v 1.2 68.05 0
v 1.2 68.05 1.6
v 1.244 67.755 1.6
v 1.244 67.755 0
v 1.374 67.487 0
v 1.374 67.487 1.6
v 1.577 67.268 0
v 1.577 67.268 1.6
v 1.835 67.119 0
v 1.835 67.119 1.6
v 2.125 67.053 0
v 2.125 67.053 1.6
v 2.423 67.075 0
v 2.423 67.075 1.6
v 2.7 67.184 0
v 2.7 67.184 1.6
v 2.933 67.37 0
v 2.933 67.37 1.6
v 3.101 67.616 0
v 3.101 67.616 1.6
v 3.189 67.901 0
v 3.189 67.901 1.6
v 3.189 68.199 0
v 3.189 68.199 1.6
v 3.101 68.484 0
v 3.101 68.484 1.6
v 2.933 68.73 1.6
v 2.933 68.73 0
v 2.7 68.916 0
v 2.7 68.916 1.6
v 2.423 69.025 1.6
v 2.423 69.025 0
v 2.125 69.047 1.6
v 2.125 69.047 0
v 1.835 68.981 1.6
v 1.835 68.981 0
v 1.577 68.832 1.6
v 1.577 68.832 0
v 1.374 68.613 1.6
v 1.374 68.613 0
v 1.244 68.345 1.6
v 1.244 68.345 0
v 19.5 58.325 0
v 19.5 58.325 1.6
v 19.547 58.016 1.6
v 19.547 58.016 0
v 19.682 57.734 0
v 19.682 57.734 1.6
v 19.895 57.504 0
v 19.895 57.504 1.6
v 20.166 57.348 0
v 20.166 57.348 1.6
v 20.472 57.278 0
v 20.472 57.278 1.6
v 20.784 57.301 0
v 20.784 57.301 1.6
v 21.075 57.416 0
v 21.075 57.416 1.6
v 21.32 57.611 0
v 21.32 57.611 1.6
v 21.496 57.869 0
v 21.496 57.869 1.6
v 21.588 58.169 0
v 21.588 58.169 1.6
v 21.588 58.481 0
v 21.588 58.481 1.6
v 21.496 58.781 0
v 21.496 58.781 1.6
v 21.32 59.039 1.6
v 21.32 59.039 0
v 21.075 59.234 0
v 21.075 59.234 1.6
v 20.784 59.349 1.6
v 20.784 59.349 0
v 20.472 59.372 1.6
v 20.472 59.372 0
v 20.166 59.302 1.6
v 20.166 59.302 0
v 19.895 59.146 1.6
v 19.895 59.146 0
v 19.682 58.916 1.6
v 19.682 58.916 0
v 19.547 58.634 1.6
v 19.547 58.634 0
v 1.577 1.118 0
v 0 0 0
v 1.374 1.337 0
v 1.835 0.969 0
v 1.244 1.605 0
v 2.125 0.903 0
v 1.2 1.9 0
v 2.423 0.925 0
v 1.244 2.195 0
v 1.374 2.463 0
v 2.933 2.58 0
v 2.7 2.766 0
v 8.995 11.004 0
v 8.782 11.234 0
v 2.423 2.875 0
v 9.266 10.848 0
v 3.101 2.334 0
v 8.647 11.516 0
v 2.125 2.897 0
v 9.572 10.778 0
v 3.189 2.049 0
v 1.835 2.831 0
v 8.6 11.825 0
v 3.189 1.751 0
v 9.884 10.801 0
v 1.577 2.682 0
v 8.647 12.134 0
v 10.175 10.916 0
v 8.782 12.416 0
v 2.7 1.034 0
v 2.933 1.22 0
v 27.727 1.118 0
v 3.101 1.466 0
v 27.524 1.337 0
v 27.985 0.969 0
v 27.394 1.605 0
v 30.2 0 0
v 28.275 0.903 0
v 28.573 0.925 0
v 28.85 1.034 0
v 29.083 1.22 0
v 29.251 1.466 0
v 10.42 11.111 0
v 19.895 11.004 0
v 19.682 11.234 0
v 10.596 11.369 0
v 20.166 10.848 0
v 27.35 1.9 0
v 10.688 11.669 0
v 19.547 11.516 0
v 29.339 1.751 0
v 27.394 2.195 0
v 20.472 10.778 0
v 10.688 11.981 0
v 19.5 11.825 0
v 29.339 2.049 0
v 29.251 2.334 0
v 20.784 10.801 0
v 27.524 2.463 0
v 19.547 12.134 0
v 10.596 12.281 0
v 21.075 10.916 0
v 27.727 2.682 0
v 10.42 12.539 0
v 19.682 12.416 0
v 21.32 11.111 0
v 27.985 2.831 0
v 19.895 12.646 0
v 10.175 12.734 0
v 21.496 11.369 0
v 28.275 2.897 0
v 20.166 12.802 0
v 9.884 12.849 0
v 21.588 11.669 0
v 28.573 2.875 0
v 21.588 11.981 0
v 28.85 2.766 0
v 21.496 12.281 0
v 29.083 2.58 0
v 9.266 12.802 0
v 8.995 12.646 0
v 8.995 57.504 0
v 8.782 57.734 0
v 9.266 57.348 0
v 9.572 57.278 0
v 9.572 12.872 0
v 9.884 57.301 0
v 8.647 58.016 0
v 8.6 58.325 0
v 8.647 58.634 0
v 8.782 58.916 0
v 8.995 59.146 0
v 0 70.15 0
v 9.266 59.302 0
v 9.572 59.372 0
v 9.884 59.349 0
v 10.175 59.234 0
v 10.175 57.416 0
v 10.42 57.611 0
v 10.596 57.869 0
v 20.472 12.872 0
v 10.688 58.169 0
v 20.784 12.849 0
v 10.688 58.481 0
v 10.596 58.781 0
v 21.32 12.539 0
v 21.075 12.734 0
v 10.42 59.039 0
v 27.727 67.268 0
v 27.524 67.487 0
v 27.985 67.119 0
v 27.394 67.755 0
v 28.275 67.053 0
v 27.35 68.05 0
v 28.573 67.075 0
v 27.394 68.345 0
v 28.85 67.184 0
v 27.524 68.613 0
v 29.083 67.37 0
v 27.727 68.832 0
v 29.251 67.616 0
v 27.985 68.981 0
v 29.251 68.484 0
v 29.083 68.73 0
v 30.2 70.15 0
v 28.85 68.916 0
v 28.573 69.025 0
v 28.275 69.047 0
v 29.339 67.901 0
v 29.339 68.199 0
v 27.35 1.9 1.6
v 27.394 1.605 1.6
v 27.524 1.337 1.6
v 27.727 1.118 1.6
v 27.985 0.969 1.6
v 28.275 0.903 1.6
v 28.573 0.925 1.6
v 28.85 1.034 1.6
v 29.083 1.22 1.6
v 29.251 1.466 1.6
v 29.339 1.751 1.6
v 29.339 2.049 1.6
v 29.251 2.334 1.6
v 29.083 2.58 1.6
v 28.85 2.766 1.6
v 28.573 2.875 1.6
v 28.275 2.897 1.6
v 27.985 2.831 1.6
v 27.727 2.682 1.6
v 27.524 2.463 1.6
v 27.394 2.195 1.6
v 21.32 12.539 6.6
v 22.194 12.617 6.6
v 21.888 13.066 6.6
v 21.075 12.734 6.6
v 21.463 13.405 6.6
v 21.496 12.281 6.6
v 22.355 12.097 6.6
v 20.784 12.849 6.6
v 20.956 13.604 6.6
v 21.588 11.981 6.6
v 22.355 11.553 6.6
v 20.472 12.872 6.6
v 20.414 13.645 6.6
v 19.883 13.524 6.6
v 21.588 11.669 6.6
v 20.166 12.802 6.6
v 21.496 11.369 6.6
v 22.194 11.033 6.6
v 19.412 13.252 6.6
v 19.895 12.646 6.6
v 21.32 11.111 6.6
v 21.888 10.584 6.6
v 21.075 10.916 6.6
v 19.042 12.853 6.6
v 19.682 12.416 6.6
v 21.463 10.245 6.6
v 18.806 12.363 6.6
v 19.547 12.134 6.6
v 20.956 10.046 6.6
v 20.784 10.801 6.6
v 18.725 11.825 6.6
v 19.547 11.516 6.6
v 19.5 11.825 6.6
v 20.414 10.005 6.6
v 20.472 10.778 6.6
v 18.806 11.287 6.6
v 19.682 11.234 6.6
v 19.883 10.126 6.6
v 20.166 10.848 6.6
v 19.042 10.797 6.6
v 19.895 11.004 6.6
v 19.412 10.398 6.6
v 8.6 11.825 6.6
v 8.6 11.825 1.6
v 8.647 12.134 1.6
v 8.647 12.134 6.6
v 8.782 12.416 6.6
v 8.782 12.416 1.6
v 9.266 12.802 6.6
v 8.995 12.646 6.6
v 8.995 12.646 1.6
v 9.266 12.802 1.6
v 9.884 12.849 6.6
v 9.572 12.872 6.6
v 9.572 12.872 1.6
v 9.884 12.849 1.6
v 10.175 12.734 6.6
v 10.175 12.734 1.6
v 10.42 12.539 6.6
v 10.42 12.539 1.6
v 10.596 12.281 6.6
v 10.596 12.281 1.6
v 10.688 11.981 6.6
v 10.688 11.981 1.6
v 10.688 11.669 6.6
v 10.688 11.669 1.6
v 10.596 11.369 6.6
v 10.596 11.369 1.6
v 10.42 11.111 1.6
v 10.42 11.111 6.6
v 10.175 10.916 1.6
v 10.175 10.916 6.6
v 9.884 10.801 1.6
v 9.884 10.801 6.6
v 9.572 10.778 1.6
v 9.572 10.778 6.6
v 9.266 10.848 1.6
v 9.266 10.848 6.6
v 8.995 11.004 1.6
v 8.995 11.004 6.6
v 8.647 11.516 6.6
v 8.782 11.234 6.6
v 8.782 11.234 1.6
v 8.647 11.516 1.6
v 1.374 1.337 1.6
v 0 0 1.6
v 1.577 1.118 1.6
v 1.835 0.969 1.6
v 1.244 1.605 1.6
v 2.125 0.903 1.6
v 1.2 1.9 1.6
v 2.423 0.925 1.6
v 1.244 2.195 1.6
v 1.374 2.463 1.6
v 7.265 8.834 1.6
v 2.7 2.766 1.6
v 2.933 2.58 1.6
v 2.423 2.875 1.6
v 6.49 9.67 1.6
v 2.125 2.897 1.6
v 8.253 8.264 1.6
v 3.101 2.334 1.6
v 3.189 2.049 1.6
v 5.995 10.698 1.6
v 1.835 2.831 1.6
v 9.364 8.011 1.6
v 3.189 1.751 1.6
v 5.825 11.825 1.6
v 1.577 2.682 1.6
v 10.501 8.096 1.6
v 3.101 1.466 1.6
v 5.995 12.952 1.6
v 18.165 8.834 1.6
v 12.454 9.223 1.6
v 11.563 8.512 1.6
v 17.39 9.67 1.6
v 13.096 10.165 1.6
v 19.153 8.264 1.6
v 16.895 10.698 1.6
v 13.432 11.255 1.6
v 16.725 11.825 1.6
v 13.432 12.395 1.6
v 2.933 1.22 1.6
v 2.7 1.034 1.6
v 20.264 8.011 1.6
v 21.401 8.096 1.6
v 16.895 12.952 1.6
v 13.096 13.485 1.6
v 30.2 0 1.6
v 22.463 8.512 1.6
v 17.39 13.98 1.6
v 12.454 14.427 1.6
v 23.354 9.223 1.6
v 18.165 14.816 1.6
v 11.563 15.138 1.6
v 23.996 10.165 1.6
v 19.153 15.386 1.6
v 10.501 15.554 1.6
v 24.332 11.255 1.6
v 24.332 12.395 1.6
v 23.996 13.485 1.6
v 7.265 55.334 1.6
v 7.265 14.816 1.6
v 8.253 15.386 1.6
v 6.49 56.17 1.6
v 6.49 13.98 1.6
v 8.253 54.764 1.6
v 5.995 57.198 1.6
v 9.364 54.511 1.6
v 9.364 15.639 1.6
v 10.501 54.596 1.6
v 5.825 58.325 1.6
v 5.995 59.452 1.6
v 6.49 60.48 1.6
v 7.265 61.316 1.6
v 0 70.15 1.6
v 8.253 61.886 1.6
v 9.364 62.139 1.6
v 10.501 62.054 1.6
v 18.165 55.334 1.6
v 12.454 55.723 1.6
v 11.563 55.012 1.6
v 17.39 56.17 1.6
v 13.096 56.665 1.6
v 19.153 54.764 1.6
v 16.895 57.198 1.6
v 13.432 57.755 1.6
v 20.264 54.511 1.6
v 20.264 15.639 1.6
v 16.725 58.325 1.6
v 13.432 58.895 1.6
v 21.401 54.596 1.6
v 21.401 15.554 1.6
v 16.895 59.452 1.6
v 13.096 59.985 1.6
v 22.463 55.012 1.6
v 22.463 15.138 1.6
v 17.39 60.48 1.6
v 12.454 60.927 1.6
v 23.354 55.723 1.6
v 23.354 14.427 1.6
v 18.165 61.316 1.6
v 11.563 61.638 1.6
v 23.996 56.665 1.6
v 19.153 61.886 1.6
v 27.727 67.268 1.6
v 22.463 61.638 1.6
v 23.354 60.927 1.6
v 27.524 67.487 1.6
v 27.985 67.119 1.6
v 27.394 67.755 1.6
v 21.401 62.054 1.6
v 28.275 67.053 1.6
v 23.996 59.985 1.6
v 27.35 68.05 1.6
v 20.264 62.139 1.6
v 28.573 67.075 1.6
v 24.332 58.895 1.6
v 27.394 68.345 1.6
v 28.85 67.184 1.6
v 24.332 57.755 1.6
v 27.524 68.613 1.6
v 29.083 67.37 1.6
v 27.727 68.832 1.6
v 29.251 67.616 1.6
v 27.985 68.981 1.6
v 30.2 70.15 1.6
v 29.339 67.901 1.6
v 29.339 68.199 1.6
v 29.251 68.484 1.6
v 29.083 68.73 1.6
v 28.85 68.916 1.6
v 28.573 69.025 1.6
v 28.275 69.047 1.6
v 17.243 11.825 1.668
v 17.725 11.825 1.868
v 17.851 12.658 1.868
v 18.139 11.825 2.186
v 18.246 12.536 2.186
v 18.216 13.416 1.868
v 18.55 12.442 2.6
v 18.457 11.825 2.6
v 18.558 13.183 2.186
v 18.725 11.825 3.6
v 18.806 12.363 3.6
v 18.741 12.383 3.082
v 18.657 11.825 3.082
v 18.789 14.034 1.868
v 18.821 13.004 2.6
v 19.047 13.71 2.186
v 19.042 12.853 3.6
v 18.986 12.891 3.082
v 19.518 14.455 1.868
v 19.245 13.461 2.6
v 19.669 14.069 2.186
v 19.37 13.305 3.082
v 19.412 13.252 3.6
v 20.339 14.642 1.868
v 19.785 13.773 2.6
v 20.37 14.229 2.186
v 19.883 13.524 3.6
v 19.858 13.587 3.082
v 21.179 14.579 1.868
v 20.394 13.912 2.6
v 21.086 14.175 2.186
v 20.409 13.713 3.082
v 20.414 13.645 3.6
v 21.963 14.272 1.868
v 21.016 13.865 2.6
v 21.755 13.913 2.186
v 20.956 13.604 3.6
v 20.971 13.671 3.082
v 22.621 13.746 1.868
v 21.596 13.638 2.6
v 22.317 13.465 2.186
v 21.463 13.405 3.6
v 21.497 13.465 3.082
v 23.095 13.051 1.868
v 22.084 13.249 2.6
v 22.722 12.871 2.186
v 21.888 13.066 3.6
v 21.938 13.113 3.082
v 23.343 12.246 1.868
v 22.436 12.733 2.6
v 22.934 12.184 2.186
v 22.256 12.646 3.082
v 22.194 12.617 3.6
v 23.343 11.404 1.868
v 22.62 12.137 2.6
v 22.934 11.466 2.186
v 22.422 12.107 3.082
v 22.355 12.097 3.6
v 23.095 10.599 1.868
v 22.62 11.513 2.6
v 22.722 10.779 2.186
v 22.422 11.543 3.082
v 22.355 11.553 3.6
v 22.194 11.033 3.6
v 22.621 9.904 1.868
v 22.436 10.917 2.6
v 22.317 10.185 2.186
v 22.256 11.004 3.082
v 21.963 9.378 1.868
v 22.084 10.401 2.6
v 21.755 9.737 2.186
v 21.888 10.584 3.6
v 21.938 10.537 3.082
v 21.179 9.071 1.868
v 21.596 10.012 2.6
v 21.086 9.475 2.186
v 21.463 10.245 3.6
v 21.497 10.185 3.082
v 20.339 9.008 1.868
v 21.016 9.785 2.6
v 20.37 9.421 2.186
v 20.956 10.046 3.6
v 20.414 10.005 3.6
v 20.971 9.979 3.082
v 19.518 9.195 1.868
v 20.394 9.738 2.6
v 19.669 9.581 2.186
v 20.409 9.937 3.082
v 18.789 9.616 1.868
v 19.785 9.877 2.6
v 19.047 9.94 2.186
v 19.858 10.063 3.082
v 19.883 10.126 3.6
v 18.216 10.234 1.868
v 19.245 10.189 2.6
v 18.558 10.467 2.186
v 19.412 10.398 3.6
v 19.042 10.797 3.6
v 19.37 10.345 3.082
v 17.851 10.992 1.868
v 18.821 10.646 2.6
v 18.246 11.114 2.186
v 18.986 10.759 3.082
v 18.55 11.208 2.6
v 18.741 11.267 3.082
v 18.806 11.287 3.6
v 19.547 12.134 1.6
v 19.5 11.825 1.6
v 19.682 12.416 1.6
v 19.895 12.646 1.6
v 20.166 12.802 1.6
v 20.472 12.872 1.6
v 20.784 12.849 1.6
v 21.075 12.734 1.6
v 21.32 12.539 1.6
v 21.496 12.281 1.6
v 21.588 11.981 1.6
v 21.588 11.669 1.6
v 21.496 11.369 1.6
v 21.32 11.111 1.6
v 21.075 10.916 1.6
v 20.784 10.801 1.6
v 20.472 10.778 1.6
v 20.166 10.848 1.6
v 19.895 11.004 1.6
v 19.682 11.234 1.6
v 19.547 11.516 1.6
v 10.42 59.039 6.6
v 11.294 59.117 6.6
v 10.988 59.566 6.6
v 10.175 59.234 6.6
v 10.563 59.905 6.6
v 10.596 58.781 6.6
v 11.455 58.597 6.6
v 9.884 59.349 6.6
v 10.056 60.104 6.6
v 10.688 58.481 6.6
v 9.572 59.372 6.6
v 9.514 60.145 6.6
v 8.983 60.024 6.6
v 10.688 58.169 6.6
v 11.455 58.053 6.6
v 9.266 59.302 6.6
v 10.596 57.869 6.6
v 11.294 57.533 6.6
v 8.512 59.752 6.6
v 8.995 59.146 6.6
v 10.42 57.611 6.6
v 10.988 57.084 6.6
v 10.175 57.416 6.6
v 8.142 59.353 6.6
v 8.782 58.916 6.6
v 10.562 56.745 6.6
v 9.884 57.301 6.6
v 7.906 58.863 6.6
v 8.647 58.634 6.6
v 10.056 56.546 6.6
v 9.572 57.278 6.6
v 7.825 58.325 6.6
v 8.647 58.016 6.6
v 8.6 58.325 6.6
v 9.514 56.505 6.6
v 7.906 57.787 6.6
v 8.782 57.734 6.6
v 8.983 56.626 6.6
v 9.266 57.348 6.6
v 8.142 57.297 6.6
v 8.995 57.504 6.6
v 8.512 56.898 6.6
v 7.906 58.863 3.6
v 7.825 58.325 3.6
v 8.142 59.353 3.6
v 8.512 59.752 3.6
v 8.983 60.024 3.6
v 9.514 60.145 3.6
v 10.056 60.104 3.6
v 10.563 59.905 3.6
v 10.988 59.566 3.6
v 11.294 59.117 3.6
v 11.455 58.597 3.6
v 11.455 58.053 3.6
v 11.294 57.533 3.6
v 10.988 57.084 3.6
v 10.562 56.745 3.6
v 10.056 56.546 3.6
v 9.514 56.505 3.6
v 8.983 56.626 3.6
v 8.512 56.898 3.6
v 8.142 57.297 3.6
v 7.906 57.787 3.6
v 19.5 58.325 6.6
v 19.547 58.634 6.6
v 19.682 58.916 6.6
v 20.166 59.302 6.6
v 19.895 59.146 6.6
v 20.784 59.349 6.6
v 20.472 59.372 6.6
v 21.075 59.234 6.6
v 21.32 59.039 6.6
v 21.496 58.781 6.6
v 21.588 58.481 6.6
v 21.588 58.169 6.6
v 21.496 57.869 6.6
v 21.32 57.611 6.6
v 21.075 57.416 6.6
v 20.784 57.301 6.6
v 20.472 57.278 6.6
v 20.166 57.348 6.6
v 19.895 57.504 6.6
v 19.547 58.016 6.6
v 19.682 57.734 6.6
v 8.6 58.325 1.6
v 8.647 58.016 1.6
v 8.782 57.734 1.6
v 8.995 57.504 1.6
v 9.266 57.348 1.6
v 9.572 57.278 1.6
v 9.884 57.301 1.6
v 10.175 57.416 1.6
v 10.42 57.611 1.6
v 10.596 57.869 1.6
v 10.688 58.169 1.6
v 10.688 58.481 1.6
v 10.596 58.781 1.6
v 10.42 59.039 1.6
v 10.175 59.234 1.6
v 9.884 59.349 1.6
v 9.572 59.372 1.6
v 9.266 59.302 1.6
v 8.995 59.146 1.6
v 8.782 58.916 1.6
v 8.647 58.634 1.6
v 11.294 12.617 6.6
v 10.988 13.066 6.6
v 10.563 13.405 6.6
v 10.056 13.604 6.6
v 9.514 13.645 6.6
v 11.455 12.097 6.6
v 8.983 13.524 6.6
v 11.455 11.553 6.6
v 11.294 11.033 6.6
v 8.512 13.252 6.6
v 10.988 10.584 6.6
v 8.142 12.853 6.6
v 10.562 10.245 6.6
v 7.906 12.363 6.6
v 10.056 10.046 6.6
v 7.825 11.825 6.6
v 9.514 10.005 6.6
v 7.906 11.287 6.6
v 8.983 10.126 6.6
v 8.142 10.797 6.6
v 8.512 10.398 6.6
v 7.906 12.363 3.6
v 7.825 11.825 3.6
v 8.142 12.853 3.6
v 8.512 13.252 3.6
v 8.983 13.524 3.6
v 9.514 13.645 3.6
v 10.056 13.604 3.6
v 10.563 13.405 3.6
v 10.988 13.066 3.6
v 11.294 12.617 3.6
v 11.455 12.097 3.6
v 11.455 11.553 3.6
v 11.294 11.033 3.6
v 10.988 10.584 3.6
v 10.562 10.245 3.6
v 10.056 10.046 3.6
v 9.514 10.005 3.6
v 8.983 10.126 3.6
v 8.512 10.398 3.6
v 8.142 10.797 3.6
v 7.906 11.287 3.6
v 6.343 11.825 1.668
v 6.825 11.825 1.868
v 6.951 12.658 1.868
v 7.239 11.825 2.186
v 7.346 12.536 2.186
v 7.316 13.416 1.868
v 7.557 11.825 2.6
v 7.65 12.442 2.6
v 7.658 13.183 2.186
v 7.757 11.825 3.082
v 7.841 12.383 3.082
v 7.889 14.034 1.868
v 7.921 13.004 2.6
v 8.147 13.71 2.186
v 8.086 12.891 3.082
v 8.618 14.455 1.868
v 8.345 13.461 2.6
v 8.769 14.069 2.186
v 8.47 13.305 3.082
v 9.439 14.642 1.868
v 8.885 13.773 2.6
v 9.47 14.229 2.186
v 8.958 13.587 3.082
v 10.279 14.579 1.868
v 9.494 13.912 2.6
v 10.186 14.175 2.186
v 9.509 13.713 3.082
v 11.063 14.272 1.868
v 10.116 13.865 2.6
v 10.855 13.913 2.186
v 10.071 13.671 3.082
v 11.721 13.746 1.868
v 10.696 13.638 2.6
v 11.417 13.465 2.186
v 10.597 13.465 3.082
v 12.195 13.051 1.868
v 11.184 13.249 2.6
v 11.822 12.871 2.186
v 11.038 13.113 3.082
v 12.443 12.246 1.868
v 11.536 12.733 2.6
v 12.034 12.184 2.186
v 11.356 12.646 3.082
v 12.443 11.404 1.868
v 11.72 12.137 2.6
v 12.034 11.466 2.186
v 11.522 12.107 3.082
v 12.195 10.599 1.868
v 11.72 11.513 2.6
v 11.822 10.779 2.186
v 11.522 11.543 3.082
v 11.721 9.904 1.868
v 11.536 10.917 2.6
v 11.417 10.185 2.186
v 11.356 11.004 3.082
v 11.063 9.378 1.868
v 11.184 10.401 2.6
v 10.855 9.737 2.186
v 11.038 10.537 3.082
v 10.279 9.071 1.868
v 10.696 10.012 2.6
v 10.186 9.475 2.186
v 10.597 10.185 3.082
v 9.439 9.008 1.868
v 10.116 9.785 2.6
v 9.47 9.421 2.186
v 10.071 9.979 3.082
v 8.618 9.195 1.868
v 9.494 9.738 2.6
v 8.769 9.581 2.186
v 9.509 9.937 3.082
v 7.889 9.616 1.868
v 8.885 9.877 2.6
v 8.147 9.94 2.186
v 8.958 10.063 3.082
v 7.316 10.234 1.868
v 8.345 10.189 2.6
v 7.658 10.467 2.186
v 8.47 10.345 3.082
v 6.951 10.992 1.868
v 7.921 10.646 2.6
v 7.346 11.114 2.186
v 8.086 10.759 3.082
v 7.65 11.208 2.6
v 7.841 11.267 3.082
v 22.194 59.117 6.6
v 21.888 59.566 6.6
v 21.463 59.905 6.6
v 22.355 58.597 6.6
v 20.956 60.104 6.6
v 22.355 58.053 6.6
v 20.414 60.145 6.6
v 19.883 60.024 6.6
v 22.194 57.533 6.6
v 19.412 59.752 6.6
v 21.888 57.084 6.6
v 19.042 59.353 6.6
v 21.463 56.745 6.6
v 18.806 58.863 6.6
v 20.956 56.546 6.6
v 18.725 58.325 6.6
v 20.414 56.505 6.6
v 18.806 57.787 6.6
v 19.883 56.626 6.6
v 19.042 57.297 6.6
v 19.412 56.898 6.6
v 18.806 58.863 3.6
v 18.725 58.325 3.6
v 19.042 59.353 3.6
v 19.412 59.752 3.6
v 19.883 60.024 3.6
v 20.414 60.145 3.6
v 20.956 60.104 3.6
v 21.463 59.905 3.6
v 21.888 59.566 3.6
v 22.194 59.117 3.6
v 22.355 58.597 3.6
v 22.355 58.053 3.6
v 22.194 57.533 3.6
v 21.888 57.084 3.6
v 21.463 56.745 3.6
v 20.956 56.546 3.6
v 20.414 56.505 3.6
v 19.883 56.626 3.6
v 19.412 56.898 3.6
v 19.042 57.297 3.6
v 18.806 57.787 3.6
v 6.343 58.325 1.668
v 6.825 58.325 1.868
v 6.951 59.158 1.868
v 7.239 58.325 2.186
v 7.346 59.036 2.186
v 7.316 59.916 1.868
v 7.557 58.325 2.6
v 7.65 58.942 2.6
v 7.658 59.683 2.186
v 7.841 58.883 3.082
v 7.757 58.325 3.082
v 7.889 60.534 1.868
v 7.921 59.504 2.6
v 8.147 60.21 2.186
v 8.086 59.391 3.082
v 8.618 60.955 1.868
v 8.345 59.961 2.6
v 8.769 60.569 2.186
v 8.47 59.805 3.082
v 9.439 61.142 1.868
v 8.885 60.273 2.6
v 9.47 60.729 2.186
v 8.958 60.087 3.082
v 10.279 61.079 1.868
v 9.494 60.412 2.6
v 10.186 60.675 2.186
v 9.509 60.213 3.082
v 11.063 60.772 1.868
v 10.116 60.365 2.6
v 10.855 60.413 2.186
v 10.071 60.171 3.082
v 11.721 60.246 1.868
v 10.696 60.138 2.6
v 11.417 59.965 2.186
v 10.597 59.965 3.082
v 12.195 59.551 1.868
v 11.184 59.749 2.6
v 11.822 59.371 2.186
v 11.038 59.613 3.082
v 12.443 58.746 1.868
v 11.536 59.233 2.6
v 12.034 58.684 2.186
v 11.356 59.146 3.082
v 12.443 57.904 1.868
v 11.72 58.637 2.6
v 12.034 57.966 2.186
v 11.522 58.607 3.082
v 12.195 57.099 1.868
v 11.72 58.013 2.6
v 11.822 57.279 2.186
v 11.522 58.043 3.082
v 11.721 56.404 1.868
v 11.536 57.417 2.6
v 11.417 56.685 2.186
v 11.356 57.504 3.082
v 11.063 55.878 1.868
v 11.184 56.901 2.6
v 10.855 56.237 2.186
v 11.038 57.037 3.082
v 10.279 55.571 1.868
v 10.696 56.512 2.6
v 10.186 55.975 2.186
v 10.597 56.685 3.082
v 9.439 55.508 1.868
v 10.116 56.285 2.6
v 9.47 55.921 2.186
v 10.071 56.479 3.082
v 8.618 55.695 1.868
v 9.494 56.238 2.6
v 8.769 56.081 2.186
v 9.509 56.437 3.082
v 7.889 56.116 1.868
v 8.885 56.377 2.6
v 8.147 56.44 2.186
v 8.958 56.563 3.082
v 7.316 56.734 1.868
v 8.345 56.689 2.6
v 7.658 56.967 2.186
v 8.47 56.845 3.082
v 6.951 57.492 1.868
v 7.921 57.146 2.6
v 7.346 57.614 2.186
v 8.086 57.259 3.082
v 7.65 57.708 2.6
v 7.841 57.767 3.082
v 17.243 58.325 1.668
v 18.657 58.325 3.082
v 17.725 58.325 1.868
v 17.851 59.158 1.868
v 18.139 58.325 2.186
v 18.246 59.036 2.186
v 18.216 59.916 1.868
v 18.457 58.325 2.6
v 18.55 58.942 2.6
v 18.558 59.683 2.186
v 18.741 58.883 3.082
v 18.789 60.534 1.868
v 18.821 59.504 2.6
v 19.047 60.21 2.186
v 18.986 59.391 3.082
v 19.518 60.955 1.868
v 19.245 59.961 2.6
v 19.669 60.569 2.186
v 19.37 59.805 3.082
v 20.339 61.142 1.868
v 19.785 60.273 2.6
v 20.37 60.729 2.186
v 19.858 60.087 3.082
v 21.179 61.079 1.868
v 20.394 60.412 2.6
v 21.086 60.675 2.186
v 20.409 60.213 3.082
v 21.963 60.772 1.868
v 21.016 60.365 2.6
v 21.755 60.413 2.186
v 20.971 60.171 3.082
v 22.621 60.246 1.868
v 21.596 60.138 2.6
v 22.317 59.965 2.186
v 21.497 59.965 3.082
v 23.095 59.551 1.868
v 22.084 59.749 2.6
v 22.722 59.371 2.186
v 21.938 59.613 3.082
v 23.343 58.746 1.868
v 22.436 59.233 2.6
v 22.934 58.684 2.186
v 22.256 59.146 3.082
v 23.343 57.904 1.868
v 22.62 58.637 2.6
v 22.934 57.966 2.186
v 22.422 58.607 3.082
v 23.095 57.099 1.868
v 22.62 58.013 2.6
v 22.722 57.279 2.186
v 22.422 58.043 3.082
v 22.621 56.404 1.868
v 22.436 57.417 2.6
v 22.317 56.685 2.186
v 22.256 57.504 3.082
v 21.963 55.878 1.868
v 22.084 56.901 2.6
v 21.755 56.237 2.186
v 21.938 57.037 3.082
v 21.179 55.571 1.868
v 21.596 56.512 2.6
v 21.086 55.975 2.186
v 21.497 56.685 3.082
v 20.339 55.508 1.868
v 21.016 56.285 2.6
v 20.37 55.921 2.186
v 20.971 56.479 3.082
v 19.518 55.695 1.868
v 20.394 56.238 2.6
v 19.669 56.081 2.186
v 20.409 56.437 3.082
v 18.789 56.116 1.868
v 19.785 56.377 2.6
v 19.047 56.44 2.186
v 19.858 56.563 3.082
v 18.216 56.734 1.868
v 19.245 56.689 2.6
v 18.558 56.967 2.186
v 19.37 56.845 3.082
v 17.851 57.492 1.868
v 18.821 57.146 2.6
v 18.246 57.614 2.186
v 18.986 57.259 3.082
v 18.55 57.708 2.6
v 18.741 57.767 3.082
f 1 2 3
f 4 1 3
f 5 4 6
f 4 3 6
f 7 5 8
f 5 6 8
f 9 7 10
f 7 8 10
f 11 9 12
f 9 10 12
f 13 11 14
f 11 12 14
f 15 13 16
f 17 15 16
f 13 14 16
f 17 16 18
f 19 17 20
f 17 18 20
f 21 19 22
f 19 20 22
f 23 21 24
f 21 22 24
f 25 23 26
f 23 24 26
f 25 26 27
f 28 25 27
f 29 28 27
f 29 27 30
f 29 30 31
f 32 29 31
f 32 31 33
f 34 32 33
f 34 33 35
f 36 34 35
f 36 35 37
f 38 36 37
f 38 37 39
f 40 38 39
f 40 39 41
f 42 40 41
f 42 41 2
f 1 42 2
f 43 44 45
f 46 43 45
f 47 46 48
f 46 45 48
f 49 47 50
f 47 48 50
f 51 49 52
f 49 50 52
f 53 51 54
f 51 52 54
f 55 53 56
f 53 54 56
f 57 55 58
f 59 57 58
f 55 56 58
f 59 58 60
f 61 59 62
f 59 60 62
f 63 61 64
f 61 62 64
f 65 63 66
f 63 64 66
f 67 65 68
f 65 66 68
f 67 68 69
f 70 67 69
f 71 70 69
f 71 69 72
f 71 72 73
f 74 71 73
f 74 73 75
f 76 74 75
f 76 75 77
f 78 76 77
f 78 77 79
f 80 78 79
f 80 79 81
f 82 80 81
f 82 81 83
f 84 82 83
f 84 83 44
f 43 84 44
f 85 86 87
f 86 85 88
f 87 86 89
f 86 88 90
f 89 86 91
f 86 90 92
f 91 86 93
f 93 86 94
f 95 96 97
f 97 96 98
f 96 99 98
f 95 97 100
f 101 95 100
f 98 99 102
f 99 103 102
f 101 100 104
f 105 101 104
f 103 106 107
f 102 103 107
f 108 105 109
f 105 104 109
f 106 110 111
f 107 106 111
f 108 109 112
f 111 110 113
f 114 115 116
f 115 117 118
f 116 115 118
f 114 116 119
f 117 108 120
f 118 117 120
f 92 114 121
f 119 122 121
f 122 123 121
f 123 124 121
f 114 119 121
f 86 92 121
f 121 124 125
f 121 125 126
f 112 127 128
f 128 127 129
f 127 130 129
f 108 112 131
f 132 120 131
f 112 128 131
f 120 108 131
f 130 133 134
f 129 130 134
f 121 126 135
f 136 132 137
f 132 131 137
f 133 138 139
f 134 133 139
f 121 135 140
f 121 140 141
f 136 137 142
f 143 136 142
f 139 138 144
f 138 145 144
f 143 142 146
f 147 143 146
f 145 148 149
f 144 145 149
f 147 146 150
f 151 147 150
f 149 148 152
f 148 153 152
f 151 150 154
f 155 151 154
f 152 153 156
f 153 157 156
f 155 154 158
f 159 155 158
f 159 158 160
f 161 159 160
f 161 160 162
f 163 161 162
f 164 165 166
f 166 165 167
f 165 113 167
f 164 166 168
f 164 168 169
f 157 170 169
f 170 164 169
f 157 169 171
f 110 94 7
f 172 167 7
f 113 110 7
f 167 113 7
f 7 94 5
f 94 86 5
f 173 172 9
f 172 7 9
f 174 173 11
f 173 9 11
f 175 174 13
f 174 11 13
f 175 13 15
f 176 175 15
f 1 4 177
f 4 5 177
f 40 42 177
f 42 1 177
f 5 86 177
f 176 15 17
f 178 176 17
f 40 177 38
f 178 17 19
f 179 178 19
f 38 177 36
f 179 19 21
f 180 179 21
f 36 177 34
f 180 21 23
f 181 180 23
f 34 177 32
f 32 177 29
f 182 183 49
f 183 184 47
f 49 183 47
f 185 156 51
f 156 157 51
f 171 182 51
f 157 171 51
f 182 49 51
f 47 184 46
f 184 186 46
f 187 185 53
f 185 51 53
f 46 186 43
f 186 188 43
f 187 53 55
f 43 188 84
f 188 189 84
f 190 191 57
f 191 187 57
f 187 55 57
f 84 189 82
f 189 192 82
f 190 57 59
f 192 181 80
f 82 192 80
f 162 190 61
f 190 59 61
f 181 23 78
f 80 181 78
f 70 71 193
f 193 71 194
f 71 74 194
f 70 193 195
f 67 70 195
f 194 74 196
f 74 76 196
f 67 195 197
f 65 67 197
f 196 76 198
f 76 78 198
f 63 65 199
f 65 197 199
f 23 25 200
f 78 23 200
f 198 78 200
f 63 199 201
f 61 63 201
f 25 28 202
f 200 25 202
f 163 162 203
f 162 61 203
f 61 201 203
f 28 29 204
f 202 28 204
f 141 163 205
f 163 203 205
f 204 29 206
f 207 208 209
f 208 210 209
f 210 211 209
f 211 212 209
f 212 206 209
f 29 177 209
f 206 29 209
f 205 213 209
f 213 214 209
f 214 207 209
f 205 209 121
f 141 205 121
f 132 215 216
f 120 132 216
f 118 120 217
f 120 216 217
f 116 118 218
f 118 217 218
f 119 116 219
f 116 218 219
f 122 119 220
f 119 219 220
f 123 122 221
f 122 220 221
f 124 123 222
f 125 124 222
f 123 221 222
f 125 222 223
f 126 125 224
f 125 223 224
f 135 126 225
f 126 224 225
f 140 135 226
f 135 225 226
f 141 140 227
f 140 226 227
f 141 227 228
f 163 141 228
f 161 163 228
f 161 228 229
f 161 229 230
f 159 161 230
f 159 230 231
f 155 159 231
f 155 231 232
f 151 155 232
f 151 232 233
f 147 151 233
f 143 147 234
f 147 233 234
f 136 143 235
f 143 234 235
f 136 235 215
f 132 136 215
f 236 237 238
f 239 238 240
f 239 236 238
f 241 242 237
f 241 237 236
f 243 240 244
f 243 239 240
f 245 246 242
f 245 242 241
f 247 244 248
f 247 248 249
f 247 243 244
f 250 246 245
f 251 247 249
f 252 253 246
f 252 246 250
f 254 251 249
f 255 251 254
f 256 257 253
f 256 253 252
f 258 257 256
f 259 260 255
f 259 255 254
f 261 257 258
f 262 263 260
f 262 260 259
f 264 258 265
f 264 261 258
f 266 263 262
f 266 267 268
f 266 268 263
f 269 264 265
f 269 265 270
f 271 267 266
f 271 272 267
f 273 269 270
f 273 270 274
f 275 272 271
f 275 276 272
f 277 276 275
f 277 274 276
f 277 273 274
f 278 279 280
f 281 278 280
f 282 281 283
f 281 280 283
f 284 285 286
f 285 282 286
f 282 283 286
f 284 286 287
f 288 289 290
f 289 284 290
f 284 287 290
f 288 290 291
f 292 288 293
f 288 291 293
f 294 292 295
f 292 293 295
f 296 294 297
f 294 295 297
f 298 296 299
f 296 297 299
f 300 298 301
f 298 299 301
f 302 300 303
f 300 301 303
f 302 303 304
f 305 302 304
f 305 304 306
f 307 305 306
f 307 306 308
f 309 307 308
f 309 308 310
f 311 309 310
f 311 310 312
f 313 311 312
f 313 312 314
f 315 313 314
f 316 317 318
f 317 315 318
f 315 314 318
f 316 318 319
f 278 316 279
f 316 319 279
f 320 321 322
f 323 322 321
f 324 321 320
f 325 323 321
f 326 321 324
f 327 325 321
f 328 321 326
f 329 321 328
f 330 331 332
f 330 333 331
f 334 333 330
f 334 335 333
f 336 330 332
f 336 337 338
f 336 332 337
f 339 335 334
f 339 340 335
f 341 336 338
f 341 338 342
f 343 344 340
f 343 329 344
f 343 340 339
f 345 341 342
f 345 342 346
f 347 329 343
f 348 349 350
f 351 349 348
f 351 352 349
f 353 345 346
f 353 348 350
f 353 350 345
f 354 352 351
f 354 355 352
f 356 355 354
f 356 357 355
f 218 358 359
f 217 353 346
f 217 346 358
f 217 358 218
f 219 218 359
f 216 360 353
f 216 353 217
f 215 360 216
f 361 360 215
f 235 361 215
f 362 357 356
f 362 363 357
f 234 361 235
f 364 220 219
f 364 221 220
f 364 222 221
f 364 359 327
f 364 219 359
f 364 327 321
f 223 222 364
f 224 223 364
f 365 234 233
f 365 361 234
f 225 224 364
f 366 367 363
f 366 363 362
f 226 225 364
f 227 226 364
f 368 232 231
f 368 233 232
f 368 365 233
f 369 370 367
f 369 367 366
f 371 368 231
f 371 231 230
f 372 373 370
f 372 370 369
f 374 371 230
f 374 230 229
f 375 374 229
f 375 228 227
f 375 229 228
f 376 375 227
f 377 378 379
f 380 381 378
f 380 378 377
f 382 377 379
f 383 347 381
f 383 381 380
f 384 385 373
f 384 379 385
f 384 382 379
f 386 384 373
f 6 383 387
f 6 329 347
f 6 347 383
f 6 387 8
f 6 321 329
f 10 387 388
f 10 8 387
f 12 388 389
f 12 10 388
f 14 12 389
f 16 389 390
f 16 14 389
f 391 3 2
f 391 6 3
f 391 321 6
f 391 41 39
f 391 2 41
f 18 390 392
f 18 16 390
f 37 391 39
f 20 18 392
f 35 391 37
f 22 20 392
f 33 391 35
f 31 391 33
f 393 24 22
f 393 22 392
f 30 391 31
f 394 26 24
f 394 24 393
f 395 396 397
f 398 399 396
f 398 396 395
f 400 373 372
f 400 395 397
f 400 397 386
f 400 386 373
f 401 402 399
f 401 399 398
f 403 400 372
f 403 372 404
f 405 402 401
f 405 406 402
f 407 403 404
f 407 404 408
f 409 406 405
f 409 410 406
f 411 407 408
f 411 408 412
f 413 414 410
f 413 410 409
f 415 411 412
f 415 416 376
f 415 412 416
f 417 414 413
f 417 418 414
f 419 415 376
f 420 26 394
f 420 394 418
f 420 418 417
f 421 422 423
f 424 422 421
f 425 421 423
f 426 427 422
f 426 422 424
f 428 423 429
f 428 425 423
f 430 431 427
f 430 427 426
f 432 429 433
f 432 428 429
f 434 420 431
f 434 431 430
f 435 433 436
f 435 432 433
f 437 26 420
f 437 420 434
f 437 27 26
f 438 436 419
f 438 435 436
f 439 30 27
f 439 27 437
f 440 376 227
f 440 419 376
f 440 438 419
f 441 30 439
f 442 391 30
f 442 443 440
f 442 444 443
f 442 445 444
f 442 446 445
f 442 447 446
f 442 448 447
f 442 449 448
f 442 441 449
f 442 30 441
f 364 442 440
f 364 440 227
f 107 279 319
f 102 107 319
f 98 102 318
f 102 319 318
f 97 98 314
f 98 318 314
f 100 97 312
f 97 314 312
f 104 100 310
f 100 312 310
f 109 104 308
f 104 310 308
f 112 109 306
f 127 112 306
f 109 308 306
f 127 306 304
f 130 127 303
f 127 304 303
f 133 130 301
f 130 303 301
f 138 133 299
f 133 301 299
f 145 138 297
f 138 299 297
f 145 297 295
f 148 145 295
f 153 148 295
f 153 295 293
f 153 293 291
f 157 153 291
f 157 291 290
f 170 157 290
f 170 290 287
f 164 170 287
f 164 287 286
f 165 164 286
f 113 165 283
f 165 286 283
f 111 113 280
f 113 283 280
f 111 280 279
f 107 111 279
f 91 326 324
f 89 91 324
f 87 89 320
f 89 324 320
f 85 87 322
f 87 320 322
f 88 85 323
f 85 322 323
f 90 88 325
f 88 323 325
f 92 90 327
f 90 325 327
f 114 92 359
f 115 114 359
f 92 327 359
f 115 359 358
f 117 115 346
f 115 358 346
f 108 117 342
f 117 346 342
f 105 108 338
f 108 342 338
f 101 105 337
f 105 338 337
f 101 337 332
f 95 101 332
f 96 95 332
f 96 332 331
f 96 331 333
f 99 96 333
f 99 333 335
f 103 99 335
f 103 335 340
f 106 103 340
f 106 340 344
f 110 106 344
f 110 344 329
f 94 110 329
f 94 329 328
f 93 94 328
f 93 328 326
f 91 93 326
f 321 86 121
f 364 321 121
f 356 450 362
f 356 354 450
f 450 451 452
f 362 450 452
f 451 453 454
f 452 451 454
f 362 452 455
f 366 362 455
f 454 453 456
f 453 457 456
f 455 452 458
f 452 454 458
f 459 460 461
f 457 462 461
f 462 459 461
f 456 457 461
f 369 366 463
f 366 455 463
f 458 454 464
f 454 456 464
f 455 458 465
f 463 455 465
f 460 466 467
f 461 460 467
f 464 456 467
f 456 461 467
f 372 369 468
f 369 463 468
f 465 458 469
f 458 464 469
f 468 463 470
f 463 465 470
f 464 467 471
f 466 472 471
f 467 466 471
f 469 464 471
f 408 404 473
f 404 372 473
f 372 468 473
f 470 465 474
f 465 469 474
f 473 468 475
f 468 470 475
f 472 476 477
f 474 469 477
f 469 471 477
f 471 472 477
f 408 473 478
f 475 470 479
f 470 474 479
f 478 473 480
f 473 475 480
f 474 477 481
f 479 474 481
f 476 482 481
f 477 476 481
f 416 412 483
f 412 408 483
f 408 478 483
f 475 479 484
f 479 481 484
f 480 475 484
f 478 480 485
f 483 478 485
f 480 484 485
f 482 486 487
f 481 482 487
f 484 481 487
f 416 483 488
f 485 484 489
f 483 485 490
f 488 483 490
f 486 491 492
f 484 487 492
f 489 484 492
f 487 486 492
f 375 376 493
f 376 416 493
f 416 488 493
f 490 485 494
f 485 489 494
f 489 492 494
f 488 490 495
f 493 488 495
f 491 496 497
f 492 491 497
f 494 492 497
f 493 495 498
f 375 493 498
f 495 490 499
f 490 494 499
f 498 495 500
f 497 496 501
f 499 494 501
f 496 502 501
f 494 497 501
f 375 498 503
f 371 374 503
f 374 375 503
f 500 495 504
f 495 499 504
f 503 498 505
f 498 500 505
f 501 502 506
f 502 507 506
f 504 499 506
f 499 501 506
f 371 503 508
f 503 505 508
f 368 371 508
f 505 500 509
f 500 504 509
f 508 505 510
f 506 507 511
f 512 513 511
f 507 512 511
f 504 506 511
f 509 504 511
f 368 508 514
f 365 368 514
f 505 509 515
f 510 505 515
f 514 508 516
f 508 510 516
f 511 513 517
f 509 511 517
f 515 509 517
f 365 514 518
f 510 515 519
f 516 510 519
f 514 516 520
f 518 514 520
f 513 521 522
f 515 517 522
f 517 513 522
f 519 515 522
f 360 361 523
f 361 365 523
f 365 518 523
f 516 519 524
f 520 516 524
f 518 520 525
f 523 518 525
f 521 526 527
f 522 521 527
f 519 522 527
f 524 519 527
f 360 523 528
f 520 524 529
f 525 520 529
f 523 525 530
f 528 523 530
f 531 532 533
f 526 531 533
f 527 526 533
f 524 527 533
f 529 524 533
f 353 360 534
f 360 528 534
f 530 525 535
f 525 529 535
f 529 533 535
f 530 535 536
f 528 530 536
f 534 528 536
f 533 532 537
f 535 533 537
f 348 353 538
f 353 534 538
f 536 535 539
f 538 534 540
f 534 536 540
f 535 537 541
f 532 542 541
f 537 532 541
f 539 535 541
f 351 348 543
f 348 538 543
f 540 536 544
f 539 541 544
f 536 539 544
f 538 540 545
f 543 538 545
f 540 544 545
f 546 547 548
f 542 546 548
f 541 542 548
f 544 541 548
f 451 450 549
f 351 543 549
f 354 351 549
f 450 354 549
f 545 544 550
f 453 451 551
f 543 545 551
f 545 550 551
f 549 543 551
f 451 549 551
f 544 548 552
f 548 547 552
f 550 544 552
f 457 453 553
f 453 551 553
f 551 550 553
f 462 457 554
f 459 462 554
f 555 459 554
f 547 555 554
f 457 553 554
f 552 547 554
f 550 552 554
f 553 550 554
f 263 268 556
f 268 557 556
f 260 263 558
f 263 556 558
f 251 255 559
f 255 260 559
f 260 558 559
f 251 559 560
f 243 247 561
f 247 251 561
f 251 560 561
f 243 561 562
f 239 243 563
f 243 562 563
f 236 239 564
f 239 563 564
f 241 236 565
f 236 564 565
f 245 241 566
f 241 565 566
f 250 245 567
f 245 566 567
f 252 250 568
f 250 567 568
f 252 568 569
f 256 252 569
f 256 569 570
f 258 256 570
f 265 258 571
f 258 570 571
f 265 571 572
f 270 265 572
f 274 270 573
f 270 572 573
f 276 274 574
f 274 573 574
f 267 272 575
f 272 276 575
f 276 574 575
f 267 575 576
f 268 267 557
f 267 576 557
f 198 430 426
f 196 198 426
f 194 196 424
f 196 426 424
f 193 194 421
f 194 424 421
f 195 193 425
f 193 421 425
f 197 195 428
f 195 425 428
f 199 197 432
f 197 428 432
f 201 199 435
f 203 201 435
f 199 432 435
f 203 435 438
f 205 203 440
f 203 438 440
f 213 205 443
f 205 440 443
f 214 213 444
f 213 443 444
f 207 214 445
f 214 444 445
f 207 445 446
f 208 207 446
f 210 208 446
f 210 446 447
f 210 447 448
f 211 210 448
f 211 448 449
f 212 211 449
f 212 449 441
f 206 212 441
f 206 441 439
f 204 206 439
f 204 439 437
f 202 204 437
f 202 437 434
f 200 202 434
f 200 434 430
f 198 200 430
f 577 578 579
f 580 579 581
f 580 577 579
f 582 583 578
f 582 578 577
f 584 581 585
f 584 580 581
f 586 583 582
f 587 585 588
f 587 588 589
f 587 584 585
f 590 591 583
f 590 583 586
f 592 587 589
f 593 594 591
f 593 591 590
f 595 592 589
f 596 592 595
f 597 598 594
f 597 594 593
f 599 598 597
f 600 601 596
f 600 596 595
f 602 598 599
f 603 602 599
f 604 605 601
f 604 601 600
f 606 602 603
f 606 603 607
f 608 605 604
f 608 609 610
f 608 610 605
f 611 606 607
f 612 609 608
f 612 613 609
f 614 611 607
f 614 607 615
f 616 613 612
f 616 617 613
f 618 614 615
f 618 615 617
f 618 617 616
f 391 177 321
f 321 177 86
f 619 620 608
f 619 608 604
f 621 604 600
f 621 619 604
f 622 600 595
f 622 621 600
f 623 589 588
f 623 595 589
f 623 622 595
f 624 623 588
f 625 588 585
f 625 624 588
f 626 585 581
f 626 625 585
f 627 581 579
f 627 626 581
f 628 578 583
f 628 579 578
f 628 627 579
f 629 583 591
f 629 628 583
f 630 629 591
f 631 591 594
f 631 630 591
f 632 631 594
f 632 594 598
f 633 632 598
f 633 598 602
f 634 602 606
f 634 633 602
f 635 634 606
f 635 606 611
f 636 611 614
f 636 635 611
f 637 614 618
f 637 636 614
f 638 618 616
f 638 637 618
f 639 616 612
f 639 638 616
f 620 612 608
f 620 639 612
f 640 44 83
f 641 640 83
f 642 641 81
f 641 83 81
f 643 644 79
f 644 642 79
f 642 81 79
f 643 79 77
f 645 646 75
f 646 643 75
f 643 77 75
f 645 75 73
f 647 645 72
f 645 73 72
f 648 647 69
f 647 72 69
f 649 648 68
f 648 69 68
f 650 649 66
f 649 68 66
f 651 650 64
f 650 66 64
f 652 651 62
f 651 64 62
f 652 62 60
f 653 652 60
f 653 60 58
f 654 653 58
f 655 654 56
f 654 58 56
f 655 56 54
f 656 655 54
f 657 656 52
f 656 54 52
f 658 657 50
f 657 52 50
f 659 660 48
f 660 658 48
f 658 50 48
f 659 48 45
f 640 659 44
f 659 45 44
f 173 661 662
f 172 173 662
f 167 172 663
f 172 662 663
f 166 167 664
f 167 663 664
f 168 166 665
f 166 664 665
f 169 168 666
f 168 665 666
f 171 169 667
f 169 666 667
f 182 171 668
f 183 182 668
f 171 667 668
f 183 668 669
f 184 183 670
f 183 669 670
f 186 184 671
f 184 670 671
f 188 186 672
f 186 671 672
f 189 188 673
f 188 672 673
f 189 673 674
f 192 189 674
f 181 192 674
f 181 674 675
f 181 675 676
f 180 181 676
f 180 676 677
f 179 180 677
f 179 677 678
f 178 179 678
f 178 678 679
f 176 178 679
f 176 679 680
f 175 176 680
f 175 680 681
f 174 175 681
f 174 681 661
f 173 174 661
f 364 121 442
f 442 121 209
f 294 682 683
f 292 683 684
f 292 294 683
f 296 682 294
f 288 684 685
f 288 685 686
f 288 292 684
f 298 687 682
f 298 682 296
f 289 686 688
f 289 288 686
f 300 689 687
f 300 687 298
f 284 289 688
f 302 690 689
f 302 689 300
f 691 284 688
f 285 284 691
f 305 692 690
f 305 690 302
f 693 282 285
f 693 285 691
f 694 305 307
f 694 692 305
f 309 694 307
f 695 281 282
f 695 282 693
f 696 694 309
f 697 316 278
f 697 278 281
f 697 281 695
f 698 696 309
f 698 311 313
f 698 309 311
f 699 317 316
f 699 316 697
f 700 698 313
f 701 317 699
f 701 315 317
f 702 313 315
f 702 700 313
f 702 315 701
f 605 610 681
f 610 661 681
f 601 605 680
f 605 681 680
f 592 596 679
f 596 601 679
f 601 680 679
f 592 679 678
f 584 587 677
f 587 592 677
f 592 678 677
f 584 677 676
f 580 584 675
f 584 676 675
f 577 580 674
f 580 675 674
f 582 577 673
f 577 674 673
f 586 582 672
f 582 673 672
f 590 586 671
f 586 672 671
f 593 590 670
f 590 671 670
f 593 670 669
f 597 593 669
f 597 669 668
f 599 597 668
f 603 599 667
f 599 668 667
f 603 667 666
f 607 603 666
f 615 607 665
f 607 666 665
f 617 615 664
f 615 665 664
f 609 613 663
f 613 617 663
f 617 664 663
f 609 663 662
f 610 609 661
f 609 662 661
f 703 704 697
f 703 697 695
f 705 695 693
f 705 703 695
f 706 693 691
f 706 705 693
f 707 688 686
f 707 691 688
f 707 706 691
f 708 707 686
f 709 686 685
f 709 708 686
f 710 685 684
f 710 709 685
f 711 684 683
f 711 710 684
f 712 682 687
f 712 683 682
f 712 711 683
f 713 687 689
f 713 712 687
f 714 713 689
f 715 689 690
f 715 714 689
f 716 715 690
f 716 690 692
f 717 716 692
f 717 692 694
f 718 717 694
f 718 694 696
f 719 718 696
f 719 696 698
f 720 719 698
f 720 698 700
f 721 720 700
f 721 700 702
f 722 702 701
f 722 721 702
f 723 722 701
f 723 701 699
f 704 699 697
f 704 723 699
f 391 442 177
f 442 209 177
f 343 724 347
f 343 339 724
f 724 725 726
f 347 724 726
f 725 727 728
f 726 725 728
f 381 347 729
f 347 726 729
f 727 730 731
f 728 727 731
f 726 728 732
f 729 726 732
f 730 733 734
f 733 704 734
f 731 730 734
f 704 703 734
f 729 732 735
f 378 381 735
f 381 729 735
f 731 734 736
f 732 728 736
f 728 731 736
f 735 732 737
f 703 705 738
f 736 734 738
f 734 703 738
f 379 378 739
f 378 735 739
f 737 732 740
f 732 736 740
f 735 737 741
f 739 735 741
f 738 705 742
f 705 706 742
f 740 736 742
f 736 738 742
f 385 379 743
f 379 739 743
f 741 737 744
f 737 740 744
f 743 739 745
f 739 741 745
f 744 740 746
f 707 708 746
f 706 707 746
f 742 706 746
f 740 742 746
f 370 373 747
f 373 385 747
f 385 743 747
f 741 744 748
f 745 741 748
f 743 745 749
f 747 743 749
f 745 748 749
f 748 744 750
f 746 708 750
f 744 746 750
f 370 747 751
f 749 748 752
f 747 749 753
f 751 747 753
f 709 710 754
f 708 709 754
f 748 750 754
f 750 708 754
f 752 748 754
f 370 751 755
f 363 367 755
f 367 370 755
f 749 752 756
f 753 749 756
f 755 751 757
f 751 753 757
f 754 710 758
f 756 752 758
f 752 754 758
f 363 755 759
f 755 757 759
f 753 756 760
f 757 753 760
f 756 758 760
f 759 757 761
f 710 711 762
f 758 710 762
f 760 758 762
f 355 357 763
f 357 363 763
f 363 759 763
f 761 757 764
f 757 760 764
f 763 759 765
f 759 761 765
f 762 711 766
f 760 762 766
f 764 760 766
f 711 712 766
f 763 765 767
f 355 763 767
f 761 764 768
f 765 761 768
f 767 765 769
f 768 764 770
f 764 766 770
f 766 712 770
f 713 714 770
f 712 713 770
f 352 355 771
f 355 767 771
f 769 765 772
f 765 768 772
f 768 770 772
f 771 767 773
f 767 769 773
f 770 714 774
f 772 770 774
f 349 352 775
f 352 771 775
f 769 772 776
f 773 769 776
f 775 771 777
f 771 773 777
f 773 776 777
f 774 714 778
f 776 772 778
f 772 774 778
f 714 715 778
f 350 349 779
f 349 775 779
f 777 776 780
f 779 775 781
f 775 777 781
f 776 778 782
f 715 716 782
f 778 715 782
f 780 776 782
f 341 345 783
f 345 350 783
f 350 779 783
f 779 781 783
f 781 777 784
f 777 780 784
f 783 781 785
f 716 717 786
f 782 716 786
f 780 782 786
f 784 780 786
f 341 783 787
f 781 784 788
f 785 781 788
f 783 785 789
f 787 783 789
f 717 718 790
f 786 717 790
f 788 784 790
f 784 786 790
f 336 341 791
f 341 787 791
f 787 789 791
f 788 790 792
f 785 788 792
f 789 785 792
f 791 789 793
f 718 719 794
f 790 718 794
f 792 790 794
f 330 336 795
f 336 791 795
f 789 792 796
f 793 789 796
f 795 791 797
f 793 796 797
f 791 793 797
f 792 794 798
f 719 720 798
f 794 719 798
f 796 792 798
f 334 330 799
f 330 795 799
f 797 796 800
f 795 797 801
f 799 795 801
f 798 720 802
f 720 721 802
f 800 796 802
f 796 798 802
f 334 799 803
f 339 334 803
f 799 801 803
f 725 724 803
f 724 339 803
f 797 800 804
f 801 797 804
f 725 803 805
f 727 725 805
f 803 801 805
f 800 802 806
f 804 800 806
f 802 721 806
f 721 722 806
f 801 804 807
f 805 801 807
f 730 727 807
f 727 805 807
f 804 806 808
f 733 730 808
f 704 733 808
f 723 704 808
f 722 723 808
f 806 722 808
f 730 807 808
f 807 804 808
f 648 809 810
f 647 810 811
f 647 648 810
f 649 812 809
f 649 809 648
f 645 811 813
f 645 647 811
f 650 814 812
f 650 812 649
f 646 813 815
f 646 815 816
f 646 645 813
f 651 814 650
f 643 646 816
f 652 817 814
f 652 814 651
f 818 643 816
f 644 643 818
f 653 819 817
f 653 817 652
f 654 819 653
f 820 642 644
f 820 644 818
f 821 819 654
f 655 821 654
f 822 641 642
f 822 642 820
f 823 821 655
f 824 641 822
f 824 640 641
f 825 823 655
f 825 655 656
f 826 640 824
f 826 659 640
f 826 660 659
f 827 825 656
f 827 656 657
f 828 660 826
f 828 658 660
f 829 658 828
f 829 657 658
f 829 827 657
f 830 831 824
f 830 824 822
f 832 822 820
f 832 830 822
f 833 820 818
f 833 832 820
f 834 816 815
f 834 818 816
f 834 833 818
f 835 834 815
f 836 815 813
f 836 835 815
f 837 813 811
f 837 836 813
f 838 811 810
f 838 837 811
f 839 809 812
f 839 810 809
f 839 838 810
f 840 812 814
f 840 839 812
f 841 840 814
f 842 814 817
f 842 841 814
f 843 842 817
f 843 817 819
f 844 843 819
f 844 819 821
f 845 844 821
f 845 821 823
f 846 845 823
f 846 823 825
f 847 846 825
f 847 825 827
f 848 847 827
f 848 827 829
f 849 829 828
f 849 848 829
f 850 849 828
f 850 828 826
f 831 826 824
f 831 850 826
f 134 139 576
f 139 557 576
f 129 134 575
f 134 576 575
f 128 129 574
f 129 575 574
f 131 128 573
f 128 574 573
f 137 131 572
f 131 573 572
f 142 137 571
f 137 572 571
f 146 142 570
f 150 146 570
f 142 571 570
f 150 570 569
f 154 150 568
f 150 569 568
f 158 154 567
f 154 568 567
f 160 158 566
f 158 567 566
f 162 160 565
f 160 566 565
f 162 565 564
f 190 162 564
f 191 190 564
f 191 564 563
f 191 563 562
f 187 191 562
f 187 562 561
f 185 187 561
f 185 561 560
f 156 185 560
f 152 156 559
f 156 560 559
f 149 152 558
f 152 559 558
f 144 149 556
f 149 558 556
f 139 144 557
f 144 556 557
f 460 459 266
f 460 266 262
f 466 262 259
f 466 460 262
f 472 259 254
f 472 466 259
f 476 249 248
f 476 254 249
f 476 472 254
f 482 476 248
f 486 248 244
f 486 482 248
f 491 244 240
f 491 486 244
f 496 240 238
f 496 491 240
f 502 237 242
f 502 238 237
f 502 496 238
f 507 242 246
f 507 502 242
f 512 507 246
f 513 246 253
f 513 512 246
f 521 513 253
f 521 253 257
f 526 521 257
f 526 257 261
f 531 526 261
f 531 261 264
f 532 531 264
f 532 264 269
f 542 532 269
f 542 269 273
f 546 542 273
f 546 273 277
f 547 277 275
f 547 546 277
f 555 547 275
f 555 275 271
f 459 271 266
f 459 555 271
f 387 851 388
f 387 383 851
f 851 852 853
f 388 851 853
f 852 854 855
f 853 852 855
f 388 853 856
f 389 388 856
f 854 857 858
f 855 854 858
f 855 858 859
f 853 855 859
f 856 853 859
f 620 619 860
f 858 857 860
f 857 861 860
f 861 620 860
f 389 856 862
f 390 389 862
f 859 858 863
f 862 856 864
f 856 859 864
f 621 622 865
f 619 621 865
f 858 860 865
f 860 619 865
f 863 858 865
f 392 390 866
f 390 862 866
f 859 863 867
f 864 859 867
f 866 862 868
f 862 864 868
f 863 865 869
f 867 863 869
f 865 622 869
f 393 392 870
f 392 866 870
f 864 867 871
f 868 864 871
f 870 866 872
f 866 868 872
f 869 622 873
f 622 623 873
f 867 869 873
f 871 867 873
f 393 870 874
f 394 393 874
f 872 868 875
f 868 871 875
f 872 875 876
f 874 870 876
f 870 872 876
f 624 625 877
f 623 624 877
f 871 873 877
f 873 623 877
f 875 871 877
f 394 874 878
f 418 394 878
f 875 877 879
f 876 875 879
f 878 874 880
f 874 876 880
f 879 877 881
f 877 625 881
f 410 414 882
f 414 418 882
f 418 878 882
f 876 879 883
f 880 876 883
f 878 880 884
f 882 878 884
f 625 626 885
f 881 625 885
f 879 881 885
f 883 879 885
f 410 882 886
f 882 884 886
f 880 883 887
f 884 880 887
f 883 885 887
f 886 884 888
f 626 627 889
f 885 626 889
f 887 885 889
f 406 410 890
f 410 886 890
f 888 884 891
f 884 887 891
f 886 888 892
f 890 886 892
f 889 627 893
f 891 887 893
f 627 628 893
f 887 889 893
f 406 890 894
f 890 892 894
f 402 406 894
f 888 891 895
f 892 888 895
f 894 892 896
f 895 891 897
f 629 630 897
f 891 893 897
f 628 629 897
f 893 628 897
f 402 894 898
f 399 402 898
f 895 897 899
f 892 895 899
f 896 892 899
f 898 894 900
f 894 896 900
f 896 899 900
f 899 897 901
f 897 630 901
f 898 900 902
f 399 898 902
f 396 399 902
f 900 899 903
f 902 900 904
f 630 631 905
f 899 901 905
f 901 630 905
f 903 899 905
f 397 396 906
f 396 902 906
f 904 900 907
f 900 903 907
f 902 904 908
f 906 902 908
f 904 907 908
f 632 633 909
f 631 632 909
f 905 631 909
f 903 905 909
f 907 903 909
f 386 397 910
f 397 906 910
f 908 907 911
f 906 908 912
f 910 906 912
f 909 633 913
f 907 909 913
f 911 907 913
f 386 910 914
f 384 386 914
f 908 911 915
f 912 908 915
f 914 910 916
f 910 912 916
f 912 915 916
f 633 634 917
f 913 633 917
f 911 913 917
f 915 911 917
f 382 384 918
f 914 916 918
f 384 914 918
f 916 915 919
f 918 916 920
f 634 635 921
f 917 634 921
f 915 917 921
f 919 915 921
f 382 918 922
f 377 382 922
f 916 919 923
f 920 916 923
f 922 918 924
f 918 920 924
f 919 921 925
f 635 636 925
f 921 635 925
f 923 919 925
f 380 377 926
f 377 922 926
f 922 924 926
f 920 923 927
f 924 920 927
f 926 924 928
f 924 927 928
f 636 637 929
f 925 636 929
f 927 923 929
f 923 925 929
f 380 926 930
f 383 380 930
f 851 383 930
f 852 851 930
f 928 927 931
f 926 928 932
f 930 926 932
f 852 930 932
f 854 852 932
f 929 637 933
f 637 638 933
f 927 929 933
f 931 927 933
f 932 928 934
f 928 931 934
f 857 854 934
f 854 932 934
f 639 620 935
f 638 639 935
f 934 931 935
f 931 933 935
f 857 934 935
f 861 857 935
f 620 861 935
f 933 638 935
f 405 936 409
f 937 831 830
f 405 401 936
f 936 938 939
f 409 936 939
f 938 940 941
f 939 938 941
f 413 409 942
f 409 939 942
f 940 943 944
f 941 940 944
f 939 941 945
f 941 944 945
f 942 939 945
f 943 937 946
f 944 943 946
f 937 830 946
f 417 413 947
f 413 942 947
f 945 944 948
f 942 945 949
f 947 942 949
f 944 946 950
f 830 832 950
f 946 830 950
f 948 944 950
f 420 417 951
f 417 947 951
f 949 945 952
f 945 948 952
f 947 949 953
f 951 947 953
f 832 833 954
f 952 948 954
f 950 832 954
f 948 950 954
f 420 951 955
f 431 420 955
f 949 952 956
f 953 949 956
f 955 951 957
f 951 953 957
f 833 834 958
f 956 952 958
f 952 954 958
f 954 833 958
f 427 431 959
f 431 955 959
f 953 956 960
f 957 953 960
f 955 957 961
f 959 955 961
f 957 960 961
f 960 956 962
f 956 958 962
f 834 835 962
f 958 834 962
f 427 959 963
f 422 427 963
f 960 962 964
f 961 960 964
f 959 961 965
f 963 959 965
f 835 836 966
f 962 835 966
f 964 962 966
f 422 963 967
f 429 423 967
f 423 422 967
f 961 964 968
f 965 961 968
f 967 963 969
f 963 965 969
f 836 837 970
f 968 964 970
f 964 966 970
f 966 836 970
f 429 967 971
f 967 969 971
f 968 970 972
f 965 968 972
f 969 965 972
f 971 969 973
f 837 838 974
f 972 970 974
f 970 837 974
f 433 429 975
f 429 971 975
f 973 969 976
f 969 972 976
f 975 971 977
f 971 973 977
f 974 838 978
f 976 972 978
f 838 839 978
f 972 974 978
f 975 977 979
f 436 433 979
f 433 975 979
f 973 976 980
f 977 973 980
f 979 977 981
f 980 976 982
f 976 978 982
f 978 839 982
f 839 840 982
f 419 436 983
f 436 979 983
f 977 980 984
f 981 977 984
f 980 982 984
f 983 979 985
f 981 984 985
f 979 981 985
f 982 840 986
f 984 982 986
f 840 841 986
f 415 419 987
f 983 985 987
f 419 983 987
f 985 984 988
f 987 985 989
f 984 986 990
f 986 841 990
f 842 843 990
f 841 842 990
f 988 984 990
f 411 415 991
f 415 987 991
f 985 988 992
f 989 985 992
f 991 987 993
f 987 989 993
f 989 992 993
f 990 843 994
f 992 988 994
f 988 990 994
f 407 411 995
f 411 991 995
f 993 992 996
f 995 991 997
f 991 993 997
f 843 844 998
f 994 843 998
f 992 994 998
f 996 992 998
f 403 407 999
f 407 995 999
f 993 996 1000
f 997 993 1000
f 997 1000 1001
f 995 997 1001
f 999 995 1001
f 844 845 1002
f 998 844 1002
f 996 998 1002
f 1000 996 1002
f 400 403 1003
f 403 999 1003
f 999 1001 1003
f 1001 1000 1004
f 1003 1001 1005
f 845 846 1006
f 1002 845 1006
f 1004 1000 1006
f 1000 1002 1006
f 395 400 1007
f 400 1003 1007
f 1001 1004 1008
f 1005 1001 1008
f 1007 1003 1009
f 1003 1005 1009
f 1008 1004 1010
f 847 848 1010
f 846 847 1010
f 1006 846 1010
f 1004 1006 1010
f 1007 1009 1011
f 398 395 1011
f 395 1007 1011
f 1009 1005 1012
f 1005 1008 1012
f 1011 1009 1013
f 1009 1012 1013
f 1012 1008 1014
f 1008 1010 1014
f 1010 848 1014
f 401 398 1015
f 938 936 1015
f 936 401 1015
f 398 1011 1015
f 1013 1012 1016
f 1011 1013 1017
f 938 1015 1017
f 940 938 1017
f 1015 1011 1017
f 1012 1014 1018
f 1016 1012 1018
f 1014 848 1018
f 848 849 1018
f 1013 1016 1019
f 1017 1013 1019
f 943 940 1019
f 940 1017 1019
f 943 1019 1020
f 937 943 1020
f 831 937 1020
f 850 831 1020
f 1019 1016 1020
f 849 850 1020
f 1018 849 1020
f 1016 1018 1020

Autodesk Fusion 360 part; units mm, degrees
sketch "Sketch1" plane through (0, 0, 0) normal (0, 0, 1) x (1, 0, 0)
  line L0 (0, 0) -> (30.2, 0)
  line L1 (30.2, 0) -> (30.2, 70.15)
  line L2 (30.2, 70.15) -> (0, 70.15)
  line L3 (0, 70.15) -> (0, 0)
  dimension "d1" = 30.2
  dimension "d2" = 70.15
extrude "Extrude1" add sketch "Sketch1" along normal blind 1.6
sketch "Sketch3" plane through (0, 0, 1.6) normal (0, 0, 1) x (-1, 0, 0)
  line L0 (0, -70.15) -> (0, 0)
  line L1 (0, 0) -> (-30.2, 0)
  line L2 (-30.2, 0) -> (-30.2, -70.15)
  line L3 (-30.2, -70.15) -> (0, -70.15)
  circle A0 centre (-2.2, -68.05) radius 1
  circle A1 centre (-28.35, -68.05) radius 1
  circle A2 centre (-2.2, -1.9) radius 1
  circle A3 centre (-28.35, -1.9) radius 1
  dimension "d7" = 2
  dimension "d12" = -26.15
  dimension "d13" = 66.15
  dimension "d16" = 2.2
  dimension "d17" = 2.1
extrude "Extrude2" cut sketch "Sketch3" against normal blind 1.6 contours A0 | A1 | A2 | A3
sketch "Sketch5" plane through (0, 0, 1.6) normal (0, 0, 1) x (-1, 0, 0)
  circle A0 centre (-2.2, -1.9) radius 1
  circle A1 centre (-28.35, -68.05) radius 1
  circle A2 centre (-28.35, -1.9) radius 1
  circle A3 centre (-2.2, -68.05) radius 1
  line L0 (0, -70.15) -> (0, 0)
  line L1 (0, 0) -> (-30.2, 0)
  line L2 (-30.2, 0) -> (-30.2, -70.15)
  line L3 (-30.2, -70.15) -> (0, -70.15)
  line L4 (-9.65, -58.325) -> (-20.55, -58.325) construction
  line L5 (-20.55, -58.325) -> (-20.55, -11.825) construction
  line L6 (-20.55, -11.825) -> (-9.65, -11.825) construction
  line L7 (-9.65, -11.825) -> (-9.65, -58.325) construction
  line L8 (-15.1, -70.15) -> (-15.1, 0) construction
  line L9 (0, -35.075) -> (-30.2, -35.075) construction
  line L10 (-9.65, -35.075) -> (-20.55, -35.075) construction
  line L11 (-15.1, -58.325) -> (-15.1, -11.825) construction
  circle A4 centre (-9.65, -58.325) radius 1.05
  circle A5 centre (-20.55, -58.325) radius 1.05
  circle A6 centre (-9.65, -11.825) radius 1.05
  circle A7 centre (-20.55, -11.825) radius 1.05
  dimension "d18" = 46.5
  dimension "d19" = 10.9
  dimension "d20" = 2.1
  dimension "d39" = -10.9
  dimension "d40" = 46.5
extrude "Extrude3" cut sketch "Sketch5" against normal up to surface (1.6 mm away) contours A4 | A5 | A6 | A7
sketch "Sketch6" plane through (0, 0, 1.6) normal (0, 0, 1) x (-1, 0, 0)
  line L0 (0, -70.15) -> (0, 0)
  line L1 (0, 0) -> (-30.2, 0)
  line L2 (-30.2, 0) -> (-30.2, -70.15)
  line L3 (-30.2, -70.15) -> (0, -70.15)
  circle A0 centre (-2.2, -68.05) radius 1
  circle A1 centre (-28.35, -1.9) radius 1
  circle A2 centre (-28.35, -68.05) radius 1
  circle A3 centre (-2.2, -1.9) radius 1
  circle A4 centre (-9.65, -58.325) radius 1.05
  circle A5 centre (-9.65, -58.325) radius 1.05
  circle A6 centre (-9.65, -58.325) radius 1.825
  circle A7 centre (-20.55, -58.325) radius 1.05
  circle A8 centre (-9.65, -11.825) radius 1.05
  circle A9 centre (-20.55, -11.825) radius 1.05
  circle A10 centre (-20.55, -58.325) radius 1.05
  circle A11 centre (-20.55, -58.325) radius 1.825
  circle A12 centre (-9.65, -11.825) radius 1.05
  circle A13 centre (-9.65, -11.825) radius 1.825
  circle A14 centre (-20.55, -11.825) radius 1.05
  circle A15 centre (-20.55, -11.825) radius 1.825
  dimension "d27" = 3.65
  dimension "d28" = 2.1
  dimension "d43" = -10.9
  dimension "d44" = 46.5
extrude "Extrude4" add sketch "Sketch6" along normal blind 5 contours A6 | A11 | A13 | A15
fillet "Fillet1" radius 2 4 edges at (22.2515, 57.6651, 1.6) (11.3515, 57.6651, 1.6) (22.2515, 11.1651, 1.6) (11.3515, 11.1651, 1.6)
